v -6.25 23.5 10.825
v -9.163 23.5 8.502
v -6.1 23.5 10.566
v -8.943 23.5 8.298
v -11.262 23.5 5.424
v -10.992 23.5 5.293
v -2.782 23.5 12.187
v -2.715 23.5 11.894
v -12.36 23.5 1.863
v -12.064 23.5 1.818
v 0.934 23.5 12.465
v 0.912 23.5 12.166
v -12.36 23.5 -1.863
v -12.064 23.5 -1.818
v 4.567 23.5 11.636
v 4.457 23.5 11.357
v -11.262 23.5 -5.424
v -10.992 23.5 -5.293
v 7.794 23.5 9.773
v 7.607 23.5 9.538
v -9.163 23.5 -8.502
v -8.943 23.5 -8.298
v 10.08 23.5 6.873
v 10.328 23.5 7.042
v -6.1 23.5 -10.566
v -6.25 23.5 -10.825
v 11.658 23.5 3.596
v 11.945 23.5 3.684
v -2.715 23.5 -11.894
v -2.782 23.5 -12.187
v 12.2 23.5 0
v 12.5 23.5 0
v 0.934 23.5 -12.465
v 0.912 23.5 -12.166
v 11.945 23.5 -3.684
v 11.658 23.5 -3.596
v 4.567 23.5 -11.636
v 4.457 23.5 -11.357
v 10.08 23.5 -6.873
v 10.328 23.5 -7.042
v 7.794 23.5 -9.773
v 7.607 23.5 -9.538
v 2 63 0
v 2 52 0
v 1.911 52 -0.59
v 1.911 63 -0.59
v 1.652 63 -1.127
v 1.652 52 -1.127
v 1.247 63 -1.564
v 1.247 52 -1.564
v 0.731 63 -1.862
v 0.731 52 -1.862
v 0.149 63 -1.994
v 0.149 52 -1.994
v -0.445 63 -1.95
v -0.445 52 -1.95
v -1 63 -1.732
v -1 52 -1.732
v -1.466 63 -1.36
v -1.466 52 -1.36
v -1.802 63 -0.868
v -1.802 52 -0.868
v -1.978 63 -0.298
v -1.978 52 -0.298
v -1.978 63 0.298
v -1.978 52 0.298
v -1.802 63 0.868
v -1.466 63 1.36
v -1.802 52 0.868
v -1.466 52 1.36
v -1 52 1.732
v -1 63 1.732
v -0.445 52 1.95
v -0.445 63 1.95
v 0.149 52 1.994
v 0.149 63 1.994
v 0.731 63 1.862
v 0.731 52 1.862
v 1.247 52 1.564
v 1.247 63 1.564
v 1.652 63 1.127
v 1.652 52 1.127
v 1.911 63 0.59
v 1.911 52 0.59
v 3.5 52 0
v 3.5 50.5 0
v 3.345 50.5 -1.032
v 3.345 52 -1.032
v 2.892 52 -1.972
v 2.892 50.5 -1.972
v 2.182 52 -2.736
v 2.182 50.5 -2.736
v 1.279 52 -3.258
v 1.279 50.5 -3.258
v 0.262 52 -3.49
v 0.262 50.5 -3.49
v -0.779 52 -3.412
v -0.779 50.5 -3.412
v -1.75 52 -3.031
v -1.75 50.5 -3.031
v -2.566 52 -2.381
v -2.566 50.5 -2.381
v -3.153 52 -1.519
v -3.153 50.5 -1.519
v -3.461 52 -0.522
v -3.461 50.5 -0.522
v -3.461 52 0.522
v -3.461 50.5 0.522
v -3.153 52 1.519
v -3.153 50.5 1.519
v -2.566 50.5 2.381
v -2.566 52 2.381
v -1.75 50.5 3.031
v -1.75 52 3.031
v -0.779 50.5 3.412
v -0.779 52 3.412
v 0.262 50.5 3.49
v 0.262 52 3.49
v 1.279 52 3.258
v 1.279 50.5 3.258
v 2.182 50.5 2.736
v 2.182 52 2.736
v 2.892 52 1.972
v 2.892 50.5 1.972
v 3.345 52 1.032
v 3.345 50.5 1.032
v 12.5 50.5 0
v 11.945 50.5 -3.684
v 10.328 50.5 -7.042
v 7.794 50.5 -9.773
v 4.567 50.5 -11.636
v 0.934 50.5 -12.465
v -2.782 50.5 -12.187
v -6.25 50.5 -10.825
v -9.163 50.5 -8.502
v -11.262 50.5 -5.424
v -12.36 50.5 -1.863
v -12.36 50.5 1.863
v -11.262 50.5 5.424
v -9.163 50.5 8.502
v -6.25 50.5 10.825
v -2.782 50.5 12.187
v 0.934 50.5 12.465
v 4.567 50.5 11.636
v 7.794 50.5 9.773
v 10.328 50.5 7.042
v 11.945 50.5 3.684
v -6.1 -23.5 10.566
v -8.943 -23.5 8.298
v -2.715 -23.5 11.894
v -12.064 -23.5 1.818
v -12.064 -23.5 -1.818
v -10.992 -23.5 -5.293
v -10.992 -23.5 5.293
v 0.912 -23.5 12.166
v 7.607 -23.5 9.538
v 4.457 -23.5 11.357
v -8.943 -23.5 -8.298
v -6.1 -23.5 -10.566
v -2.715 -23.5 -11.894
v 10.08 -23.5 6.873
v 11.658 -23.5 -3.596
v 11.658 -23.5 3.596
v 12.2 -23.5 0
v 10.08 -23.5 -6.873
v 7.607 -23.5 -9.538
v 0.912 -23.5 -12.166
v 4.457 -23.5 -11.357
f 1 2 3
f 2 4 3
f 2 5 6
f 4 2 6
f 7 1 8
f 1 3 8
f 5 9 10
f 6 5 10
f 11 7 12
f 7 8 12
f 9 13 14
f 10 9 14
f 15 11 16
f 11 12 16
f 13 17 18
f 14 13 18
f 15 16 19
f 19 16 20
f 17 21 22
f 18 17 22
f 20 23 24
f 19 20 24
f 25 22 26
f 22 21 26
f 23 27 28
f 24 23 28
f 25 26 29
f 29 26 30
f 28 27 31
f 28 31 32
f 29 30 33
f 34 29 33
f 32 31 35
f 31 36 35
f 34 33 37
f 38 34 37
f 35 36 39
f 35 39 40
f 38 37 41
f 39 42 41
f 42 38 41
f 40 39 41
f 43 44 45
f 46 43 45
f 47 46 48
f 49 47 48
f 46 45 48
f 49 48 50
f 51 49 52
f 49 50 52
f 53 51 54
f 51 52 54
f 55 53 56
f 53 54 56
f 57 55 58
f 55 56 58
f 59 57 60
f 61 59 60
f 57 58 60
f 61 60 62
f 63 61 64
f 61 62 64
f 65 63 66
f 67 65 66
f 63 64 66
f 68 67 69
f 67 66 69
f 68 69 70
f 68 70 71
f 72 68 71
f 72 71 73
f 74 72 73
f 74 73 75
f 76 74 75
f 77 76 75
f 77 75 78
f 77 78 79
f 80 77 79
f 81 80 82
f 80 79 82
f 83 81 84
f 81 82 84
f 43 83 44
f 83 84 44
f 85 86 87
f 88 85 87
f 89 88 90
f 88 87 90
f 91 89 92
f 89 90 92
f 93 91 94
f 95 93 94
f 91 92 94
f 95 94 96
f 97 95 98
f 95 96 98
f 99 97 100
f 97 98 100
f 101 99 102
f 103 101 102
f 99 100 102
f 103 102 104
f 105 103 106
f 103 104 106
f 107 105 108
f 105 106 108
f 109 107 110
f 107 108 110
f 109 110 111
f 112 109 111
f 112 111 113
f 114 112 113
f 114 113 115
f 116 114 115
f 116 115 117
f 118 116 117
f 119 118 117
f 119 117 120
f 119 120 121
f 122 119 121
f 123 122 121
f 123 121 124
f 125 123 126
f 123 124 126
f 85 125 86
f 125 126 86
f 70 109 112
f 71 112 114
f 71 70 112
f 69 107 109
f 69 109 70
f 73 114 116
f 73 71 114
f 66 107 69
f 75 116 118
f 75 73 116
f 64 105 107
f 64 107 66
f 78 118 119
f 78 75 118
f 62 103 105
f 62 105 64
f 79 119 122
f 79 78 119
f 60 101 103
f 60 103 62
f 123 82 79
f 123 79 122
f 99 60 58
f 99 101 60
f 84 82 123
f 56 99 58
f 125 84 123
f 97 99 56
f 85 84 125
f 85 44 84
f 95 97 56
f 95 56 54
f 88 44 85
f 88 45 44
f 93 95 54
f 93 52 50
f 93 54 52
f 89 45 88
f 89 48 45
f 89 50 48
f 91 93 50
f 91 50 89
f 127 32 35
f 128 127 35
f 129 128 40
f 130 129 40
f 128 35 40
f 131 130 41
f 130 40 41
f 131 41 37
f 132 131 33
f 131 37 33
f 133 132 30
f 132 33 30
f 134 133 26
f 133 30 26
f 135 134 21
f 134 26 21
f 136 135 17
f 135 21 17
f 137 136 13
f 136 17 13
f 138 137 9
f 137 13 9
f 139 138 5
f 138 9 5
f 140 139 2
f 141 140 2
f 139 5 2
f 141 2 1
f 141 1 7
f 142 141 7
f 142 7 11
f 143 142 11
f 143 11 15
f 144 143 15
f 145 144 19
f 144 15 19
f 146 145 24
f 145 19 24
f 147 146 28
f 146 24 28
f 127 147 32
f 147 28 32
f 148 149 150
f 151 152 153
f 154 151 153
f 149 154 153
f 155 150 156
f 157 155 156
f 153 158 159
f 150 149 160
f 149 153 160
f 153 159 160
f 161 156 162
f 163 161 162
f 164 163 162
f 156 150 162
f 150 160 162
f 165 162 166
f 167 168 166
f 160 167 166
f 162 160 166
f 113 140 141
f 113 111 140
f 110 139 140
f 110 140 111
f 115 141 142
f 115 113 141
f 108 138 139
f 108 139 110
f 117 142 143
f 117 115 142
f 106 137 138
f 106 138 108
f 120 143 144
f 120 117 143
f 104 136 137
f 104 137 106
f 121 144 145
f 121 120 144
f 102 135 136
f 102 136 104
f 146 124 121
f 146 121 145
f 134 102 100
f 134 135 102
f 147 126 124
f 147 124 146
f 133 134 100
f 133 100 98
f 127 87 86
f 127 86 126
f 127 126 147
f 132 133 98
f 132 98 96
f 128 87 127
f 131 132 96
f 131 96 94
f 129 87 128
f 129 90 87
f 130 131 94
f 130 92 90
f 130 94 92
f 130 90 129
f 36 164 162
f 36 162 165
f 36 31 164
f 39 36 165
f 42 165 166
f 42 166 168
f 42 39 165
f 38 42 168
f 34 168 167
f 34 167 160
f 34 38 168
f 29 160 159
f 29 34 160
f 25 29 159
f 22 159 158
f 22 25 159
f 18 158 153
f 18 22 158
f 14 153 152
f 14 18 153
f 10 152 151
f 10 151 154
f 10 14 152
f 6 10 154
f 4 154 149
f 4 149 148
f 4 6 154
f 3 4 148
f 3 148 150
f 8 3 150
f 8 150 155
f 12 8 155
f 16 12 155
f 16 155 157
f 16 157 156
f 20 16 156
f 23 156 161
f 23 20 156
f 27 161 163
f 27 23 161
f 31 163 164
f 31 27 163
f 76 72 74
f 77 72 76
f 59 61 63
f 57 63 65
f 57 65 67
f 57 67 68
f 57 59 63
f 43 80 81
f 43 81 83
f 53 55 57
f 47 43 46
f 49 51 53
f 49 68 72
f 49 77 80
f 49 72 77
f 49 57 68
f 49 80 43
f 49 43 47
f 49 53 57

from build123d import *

# Parameters (mm, degrees)
SKETCH1_R           = 12.2
BOSS_EXTRUDE1_DEPTH = 23.5
SKETCH2_R           = 12.5
BOSS_EXTRUDE2_DEPTH = 27
SKETCH3_R           = 3.5
BOSS_EXTRUDE3_DEPTH = 1.5
SKETCH4_R           = 2
BOSS_EXTRUDE4_DEPTH = 11


with BuildPart() as part:
    # Sketch1 → Boss-Extrude1 (new body, symmetric)
    with BuildSketch(Plane(origin=(0, 0, 0), x_dir=(1, 0, 0), z_dir=(0, 1, 0))):
        Circle(SKETCH1_R)
    extrude(amount=BOSS_EXTRUDE1_DEPTH, both=True)

    # Sketch2 → Boss-Extrude2 (add)
    with BuildSketch(Plane(origin=(0, 23.5, 0), x_dir=(1, 0, 0), z_dir=(0, 1, 0))):
        Circle(SKETCH2_R)
    extrude(amount=BOSS_EXTRUDE2_DEPTH)

    # Sketch3 → Boss-Extrude3 (add)
    with BuildSketch(Plane(origin=(0, 50.5, 0), x_dir=(1, 0, 0), z_dir=(0, 1, 0))):
        Circle(SKETCH3_R)
    extrude(amount=BOSS_EXTRUDE3_DEPTH)

    # Sketch4 → Boss-Extrude4 (add)
    with BuildSketch(Plane(origin=(0, 52, 0), x_dir=(1, 0, 0), z_dir=(0, 1, 0))):
        Circle(SKETCH4_R)
    extrude(amount=BOSS_EXTRUDE4_DEPTH)


solid = part.part
